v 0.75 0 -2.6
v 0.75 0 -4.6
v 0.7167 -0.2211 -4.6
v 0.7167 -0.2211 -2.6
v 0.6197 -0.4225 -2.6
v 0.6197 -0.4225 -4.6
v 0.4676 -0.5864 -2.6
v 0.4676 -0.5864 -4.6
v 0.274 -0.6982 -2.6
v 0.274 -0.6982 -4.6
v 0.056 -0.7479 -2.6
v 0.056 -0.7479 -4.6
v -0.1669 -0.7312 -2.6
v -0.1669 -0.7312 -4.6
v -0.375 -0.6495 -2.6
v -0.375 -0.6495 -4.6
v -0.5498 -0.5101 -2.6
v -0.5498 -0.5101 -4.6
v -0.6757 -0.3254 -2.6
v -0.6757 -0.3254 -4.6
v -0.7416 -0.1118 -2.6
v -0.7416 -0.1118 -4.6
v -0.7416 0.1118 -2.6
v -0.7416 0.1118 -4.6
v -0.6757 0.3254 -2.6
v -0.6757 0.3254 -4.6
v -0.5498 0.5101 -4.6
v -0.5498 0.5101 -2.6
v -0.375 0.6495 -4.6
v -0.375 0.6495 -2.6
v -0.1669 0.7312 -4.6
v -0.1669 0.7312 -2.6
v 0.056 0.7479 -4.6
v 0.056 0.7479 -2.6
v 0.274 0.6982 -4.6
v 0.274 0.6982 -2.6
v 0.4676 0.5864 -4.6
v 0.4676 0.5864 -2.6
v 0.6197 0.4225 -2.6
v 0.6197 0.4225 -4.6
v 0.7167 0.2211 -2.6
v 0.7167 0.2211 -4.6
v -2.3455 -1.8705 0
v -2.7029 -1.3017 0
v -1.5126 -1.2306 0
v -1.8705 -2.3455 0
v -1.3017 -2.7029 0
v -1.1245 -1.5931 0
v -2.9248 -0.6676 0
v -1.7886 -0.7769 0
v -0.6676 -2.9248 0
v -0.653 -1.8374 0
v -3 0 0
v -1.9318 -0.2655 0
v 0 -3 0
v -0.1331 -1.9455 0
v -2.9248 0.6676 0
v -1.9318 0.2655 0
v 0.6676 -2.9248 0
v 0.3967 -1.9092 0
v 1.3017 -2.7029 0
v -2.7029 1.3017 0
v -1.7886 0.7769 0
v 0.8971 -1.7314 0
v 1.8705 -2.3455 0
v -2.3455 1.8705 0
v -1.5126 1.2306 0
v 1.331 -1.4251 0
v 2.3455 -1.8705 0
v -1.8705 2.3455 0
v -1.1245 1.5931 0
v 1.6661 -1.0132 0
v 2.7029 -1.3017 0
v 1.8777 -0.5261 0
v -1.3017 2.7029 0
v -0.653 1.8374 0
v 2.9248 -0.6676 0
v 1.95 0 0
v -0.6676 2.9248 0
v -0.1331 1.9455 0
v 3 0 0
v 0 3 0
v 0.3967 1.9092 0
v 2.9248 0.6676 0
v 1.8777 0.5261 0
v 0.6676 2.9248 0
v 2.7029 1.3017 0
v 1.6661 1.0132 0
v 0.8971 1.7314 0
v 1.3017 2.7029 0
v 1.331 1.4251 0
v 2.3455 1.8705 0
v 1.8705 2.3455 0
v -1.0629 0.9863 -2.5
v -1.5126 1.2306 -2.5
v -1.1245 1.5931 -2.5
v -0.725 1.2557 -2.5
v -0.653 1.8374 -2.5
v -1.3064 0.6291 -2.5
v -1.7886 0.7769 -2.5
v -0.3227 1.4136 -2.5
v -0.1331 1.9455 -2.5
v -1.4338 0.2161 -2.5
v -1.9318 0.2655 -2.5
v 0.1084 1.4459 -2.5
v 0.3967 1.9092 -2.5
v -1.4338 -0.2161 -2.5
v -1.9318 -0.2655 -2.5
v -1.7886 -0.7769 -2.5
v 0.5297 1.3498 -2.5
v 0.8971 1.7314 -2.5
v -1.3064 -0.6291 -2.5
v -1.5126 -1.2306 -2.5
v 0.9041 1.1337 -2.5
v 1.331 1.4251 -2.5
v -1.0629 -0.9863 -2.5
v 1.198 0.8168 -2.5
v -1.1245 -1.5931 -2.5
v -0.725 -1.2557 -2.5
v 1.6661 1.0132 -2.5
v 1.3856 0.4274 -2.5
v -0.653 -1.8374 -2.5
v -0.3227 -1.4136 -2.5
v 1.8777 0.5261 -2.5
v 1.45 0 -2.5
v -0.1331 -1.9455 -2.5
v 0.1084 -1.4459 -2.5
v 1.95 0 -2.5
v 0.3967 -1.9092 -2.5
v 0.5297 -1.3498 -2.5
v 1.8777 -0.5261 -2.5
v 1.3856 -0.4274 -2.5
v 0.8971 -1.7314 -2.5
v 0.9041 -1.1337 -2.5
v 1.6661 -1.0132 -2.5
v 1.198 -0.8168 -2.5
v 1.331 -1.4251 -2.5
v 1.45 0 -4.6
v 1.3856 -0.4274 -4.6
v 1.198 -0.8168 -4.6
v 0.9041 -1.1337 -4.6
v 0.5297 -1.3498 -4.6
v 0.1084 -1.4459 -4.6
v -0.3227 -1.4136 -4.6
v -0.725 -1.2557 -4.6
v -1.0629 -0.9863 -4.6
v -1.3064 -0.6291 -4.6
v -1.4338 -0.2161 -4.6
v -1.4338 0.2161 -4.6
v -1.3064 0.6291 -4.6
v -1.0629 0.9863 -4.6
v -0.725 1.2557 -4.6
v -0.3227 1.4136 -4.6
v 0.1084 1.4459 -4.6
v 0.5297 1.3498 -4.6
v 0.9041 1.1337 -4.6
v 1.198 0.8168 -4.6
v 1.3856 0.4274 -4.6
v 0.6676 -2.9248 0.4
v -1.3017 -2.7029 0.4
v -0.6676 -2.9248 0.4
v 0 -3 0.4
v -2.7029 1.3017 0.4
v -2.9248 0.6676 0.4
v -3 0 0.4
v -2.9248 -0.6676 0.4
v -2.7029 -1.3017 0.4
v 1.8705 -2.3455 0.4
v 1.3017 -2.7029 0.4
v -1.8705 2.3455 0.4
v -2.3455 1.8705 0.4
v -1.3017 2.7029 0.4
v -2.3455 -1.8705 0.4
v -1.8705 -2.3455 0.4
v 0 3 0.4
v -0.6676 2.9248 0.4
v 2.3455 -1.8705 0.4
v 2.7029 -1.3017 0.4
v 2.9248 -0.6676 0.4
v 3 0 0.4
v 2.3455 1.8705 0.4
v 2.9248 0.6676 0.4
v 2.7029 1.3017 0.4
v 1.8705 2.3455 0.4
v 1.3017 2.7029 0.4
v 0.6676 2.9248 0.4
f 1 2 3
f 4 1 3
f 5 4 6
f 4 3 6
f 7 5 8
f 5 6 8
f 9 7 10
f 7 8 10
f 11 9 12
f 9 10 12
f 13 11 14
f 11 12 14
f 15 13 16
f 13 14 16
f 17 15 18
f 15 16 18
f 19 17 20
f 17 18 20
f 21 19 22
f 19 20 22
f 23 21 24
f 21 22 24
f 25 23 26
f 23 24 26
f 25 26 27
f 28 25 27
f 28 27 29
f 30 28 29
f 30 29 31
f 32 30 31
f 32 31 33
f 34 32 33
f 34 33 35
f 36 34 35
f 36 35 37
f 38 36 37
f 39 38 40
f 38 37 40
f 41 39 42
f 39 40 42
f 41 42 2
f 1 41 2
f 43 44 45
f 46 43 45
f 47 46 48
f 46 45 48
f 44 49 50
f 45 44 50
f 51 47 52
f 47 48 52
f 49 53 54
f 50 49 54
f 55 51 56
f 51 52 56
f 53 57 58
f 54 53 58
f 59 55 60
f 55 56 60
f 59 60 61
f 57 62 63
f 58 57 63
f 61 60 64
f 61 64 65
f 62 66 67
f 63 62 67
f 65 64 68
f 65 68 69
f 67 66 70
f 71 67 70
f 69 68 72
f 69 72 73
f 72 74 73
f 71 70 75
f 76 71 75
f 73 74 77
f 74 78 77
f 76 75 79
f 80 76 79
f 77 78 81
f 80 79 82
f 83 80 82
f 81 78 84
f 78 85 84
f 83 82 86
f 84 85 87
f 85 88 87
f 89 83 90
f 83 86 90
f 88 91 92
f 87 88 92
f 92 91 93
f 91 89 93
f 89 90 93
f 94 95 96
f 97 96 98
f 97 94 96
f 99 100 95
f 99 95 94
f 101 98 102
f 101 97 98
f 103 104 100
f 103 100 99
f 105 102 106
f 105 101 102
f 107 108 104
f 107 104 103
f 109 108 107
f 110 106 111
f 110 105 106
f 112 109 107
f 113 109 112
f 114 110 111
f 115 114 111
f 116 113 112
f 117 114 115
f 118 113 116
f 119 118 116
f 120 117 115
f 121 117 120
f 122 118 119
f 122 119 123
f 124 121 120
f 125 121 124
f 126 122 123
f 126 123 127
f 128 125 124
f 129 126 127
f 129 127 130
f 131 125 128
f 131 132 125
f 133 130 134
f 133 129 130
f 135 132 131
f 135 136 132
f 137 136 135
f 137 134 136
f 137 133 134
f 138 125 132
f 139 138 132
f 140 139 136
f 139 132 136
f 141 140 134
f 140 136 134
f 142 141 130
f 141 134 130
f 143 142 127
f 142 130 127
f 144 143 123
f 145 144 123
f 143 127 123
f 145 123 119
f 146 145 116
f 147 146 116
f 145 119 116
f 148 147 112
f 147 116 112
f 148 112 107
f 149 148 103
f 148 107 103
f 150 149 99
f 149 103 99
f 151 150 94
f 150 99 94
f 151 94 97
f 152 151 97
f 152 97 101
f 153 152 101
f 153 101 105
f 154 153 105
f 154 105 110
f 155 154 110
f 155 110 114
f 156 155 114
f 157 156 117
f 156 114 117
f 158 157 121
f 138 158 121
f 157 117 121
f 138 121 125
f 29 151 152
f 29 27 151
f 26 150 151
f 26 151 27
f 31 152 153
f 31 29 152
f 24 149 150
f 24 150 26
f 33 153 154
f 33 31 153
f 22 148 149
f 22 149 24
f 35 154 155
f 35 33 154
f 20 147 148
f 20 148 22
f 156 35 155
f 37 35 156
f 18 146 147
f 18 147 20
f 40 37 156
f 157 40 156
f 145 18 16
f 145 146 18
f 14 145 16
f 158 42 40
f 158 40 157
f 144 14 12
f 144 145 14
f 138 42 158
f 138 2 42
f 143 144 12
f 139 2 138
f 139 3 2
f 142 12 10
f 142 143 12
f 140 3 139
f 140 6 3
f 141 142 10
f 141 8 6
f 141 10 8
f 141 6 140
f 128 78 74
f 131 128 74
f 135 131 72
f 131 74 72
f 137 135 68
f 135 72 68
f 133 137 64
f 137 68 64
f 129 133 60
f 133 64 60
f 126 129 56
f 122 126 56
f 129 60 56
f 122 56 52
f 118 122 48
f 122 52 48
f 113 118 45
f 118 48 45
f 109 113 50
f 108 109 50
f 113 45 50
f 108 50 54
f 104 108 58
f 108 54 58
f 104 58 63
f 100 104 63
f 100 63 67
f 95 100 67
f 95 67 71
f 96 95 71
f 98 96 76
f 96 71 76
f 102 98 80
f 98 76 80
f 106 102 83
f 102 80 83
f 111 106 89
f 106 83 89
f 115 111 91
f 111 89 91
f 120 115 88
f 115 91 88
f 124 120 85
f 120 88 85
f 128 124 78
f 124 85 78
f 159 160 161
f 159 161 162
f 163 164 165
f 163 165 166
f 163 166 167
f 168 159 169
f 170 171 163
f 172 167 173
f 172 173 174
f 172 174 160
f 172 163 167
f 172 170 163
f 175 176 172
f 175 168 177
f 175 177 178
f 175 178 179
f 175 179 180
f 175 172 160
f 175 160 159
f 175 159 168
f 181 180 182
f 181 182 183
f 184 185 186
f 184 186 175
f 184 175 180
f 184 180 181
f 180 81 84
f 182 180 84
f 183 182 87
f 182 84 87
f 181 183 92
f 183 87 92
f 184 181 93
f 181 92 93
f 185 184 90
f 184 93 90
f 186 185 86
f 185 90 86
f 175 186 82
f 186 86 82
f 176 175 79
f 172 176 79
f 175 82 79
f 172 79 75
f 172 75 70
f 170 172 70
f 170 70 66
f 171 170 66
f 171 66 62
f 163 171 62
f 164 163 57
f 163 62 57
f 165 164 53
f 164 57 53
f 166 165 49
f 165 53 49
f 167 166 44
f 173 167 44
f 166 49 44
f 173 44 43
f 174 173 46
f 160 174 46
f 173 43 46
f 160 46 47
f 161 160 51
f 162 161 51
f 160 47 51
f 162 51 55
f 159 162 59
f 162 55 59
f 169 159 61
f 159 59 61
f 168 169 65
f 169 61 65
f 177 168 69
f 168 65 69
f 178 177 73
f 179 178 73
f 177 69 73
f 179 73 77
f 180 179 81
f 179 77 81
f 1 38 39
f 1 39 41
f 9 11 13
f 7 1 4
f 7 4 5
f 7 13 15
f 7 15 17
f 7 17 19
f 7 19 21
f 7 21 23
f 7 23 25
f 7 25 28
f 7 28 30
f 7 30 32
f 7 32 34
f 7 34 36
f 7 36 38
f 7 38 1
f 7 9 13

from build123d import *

# Parameters (mm, degrees)
F0_R     = 3
F1_DEPTH = 0.4
F2_R     = 1.95
F3_DEPTH = 2.5
F4_R     = 1.45
F5_DEPTH = 2.1
F6_R     = 0.75
F7_DEPTH = 2


with BuildPart() as f1:
    # F0 (on Top) → F1 (new body)
    with BuildSketch(Plane.XY):
        Circle(F0_R)
    extrude(amount=F1_DEPTH)

    # F2 (on face) → F3 (join)
    with BuildSketch(Plane(origin=(0, 0, 0), x_dir=(1, 0, 0), z_dir=(0, 0, -1))):
        Circle(F2_R)
    extrude(amount=F3_DEPTH)

    # F4 (on face) → F5 (join)
    with BuildSketch(Plane(origin=(0, 0, -2.5), x_dir=(1, 0, 0), z_dir=(0, 0, -1))):
        Circle(F4_R)
    extrude(amount=F5_DEPTH)

    # F6 (on face) → F7 (cut)
    with BuildSketch(Plane(origin=(0, 0, -4.6), x_dir=(1, 0, 0), z_dir=(0, 0, -1))):
        Circle(F6_R)
    extrude(amount=-F7_DEPTH, mode=Mode.SUBTRACT)


solid = f1.part
